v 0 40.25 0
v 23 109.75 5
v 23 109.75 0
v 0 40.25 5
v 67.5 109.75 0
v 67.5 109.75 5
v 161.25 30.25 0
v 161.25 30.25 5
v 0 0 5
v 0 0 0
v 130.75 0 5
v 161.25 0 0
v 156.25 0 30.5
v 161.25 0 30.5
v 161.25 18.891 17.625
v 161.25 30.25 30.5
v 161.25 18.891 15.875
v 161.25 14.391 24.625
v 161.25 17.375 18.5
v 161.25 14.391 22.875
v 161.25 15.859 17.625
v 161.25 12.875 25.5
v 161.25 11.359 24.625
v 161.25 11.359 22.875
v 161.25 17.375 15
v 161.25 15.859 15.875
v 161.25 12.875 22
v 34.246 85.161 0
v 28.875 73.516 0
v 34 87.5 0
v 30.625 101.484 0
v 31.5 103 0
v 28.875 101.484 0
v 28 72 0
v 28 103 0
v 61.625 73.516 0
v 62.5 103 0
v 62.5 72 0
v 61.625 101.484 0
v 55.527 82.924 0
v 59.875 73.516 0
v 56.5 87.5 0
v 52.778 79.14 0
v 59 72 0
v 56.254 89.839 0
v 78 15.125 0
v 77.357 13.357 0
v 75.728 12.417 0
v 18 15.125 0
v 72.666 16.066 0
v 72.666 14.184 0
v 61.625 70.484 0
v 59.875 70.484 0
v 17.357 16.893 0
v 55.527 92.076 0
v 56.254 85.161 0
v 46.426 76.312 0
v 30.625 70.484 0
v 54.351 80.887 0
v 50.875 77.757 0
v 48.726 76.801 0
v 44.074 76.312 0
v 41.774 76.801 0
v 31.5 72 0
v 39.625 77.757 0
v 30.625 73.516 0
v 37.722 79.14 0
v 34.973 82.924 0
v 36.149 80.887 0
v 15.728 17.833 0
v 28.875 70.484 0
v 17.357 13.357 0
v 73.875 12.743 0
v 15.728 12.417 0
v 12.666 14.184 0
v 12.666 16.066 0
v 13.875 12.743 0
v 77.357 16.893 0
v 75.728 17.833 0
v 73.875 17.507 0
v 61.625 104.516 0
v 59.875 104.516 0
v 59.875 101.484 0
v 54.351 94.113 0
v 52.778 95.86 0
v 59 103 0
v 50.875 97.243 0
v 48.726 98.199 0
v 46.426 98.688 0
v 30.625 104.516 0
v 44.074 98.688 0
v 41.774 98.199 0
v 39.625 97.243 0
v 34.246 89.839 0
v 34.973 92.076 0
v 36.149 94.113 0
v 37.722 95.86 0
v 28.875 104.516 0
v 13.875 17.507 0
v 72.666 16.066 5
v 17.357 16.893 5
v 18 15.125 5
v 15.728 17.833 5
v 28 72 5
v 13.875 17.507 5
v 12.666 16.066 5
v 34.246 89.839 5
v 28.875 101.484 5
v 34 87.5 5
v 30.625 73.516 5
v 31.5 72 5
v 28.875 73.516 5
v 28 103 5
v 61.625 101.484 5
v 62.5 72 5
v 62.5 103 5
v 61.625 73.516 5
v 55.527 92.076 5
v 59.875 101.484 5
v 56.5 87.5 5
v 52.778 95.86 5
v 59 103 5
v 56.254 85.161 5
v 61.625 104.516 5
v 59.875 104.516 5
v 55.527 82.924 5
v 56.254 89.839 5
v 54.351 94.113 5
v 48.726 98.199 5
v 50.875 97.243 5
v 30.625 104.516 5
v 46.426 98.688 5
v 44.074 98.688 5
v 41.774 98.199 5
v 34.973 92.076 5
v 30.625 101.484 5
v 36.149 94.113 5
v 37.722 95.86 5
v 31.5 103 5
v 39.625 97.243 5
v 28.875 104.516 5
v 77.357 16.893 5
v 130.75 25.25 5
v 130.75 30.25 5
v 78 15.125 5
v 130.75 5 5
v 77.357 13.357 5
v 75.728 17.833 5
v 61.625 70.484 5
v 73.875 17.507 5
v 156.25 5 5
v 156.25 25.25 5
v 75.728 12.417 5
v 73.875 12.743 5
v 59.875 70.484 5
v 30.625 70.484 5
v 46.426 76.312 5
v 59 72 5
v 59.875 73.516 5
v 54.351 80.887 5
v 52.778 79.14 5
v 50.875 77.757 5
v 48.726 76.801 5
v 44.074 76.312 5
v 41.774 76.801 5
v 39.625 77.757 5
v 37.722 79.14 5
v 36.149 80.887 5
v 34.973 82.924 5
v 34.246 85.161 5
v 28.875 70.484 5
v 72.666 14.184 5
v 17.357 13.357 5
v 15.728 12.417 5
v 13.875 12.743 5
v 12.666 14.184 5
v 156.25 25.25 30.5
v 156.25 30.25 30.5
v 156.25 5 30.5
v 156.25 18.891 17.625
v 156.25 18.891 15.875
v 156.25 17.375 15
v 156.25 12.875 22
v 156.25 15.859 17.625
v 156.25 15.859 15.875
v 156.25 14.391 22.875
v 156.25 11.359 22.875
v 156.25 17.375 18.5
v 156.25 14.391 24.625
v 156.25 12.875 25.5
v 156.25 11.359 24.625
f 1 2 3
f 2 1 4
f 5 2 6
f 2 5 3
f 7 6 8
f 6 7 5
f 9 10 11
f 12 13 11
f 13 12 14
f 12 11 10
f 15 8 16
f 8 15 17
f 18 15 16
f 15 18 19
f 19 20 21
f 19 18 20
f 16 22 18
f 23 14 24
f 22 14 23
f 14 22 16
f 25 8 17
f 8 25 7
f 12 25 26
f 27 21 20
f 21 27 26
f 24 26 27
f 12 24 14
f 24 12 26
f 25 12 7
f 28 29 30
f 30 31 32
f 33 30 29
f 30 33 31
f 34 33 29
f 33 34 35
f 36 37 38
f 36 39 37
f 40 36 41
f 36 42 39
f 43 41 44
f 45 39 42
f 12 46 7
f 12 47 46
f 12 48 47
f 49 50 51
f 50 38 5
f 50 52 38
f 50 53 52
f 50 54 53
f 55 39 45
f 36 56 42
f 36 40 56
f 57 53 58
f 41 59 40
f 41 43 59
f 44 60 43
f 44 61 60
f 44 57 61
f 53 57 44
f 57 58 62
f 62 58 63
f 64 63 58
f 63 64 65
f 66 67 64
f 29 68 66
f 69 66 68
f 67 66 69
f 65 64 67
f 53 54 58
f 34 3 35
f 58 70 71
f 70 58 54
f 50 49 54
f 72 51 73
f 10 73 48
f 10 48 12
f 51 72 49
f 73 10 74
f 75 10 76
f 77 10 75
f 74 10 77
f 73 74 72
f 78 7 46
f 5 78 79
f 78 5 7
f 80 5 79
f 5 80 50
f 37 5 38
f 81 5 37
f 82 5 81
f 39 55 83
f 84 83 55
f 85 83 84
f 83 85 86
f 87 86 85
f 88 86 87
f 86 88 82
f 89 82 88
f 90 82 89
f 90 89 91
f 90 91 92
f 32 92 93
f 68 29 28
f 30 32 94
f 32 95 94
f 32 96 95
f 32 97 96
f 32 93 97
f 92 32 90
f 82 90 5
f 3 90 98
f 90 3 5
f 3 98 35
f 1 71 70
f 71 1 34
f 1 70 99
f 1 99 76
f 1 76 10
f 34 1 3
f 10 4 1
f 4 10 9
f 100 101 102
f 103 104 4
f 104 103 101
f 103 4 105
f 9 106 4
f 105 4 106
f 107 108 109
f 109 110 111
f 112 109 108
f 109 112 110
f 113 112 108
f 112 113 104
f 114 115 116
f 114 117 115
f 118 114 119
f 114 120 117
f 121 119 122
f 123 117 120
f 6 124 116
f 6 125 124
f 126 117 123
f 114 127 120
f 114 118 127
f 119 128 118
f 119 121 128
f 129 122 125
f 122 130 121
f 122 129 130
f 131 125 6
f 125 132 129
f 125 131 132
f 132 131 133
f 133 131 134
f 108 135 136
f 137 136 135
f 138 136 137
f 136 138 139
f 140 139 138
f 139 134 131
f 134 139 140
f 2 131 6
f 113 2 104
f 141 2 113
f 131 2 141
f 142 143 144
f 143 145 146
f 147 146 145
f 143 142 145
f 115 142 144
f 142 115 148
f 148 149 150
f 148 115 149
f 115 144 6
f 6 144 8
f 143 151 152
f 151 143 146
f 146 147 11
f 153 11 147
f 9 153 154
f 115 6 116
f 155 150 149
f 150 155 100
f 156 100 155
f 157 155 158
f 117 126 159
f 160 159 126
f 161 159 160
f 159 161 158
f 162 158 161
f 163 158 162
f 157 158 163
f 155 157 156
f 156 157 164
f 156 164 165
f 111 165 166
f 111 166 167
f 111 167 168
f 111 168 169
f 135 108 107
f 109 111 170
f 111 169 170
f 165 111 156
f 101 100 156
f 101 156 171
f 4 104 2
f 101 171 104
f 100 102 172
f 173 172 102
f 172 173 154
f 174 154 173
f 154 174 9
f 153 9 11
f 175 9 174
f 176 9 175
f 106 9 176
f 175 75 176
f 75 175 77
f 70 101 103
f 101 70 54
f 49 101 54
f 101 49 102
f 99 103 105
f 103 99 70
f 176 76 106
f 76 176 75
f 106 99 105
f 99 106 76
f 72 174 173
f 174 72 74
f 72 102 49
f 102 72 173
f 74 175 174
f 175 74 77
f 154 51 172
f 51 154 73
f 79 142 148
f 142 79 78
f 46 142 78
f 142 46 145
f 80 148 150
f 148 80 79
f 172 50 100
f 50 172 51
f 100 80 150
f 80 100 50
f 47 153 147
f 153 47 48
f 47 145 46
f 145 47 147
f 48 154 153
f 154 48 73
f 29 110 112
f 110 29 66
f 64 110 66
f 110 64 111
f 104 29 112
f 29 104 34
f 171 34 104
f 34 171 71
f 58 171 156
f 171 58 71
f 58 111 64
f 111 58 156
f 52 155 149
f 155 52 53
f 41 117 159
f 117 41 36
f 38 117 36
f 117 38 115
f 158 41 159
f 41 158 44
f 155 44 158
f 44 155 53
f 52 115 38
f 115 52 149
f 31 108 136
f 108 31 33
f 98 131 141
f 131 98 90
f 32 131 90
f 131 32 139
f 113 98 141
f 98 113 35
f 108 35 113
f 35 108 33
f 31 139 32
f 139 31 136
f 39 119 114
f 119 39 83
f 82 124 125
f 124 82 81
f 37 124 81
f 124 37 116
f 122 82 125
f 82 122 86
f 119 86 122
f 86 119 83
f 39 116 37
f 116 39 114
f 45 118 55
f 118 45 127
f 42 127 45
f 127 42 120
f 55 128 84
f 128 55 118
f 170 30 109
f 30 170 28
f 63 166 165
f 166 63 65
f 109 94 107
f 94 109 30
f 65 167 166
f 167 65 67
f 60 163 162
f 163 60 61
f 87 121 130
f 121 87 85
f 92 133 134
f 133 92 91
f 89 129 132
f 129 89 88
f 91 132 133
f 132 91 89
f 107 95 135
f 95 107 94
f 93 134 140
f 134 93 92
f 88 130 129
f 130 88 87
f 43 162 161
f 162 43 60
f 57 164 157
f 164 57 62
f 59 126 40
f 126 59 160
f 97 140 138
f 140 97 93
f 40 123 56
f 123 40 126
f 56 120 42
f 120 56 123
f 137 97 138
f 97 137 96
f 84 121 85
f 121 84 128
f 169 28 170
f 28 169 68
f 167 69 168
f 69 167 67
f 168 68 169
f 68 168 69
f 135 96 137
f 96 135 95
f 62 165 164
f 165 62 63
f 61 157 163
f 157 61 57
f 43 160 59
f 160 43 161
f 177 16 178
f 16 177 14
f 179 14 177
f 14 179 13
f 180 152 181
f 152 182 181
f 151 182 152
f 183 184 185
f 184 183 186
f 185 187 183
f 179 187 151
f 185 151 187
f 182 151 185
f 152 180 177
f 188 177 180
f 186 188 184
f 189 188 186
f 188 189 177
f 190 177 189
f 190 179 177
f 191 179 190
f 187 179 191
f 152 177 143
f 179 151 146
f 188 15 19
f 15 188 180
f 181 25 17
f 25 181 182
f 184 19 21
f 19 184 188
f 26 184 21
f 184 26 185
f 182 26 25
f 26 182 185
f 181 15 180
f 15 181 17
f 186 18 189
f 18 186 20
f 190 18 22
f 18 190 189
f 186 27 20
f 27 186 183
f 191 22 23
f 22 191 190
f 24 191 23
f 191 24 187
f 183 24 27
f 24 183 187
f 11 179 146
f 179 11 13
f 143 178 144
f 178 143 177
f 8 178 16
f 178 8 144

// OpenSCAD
// Uncomment before rendering and exporting
//$fa = 0.01;
//$fs = 0.25;    

// Module for creating the motor mount
module xAxisMotorMount()
{
    union()
    {
        // Base plate
        difference()
        {
            // Base shape
            hull()
            {
                cube([90.5, 40.25, 5]);
                translate([23, 65.25, 0])
                {
                    cube([44.5, 44.5, 5]);
                }
                translate([90.5, 0, 0])
                {
                    
                    cube([70.75, 30.25, 5]);
                }
            }
            // Mounting holes
            translate([15.25, 15.125, -1])
            {
                cylinder(7, 2.75, 2.75);
            }
            translate([75.25, 15.125, -1])
            {
                cylinder(7, 2.75, 2.75);
            }
            // Motor mounting holes
            translate([29.75, 72, -1])
            {
                cylinder(7, 1.75, 1.75);
            }
            translate([60.75, 72, -1])
            {
                cylinder(7, 1.75, 1.75);
            }
            translate([29.75, 103, -1])
            {
                cylinder(7, 1.75, 1.75);
            }
            translate([60.75, 103, -1])
            {
                cylinder(7, 1.75, 1.75);
            }
            translate([45.25, 87.5, -1])
            {
             cylinder(7, 11.25, 11.25);
            }
        }
        // Cable chain mount
        translate([130.75, 0, 0])
        {
            // Left support
            hull()
            {
                cube([30.5, 5, 5]);
                translate([25.5, 0, 5])
                {
                    cube([5, 5, 25.5]);
                }
            }
            // Mounting plate
            translate([25.5, 5, 5])
            {
                difference()
                {
                    // Base shape
                    cube([5, 20.25, 25.5]);
                    // Mounting holes
                    translate([-1, 12.375, 11.75])
                    {
                        rotate([0, 90, 0])
                        {
                            cylinder(7, 1.75, 1.75);
                        }
                    }
                    translate([-1, 7.875, 18.75])
                    {
                        rotate([0, 90, 0])
                        {
                            cylinder(7, 1.75, 1.75);
                        }
                    }
                }
            }
            // Right support
            translate([0, 25.25, 0])
            {
                hull()
                {
                    cube([30.5, 5, 5]);
                    translate([25.5, 0, 5])
                    {
                        cube([5, 5, 25.5]);
                    }
                }
            }
        }
    }
}

// Using the module
xAxisMotorMount();
